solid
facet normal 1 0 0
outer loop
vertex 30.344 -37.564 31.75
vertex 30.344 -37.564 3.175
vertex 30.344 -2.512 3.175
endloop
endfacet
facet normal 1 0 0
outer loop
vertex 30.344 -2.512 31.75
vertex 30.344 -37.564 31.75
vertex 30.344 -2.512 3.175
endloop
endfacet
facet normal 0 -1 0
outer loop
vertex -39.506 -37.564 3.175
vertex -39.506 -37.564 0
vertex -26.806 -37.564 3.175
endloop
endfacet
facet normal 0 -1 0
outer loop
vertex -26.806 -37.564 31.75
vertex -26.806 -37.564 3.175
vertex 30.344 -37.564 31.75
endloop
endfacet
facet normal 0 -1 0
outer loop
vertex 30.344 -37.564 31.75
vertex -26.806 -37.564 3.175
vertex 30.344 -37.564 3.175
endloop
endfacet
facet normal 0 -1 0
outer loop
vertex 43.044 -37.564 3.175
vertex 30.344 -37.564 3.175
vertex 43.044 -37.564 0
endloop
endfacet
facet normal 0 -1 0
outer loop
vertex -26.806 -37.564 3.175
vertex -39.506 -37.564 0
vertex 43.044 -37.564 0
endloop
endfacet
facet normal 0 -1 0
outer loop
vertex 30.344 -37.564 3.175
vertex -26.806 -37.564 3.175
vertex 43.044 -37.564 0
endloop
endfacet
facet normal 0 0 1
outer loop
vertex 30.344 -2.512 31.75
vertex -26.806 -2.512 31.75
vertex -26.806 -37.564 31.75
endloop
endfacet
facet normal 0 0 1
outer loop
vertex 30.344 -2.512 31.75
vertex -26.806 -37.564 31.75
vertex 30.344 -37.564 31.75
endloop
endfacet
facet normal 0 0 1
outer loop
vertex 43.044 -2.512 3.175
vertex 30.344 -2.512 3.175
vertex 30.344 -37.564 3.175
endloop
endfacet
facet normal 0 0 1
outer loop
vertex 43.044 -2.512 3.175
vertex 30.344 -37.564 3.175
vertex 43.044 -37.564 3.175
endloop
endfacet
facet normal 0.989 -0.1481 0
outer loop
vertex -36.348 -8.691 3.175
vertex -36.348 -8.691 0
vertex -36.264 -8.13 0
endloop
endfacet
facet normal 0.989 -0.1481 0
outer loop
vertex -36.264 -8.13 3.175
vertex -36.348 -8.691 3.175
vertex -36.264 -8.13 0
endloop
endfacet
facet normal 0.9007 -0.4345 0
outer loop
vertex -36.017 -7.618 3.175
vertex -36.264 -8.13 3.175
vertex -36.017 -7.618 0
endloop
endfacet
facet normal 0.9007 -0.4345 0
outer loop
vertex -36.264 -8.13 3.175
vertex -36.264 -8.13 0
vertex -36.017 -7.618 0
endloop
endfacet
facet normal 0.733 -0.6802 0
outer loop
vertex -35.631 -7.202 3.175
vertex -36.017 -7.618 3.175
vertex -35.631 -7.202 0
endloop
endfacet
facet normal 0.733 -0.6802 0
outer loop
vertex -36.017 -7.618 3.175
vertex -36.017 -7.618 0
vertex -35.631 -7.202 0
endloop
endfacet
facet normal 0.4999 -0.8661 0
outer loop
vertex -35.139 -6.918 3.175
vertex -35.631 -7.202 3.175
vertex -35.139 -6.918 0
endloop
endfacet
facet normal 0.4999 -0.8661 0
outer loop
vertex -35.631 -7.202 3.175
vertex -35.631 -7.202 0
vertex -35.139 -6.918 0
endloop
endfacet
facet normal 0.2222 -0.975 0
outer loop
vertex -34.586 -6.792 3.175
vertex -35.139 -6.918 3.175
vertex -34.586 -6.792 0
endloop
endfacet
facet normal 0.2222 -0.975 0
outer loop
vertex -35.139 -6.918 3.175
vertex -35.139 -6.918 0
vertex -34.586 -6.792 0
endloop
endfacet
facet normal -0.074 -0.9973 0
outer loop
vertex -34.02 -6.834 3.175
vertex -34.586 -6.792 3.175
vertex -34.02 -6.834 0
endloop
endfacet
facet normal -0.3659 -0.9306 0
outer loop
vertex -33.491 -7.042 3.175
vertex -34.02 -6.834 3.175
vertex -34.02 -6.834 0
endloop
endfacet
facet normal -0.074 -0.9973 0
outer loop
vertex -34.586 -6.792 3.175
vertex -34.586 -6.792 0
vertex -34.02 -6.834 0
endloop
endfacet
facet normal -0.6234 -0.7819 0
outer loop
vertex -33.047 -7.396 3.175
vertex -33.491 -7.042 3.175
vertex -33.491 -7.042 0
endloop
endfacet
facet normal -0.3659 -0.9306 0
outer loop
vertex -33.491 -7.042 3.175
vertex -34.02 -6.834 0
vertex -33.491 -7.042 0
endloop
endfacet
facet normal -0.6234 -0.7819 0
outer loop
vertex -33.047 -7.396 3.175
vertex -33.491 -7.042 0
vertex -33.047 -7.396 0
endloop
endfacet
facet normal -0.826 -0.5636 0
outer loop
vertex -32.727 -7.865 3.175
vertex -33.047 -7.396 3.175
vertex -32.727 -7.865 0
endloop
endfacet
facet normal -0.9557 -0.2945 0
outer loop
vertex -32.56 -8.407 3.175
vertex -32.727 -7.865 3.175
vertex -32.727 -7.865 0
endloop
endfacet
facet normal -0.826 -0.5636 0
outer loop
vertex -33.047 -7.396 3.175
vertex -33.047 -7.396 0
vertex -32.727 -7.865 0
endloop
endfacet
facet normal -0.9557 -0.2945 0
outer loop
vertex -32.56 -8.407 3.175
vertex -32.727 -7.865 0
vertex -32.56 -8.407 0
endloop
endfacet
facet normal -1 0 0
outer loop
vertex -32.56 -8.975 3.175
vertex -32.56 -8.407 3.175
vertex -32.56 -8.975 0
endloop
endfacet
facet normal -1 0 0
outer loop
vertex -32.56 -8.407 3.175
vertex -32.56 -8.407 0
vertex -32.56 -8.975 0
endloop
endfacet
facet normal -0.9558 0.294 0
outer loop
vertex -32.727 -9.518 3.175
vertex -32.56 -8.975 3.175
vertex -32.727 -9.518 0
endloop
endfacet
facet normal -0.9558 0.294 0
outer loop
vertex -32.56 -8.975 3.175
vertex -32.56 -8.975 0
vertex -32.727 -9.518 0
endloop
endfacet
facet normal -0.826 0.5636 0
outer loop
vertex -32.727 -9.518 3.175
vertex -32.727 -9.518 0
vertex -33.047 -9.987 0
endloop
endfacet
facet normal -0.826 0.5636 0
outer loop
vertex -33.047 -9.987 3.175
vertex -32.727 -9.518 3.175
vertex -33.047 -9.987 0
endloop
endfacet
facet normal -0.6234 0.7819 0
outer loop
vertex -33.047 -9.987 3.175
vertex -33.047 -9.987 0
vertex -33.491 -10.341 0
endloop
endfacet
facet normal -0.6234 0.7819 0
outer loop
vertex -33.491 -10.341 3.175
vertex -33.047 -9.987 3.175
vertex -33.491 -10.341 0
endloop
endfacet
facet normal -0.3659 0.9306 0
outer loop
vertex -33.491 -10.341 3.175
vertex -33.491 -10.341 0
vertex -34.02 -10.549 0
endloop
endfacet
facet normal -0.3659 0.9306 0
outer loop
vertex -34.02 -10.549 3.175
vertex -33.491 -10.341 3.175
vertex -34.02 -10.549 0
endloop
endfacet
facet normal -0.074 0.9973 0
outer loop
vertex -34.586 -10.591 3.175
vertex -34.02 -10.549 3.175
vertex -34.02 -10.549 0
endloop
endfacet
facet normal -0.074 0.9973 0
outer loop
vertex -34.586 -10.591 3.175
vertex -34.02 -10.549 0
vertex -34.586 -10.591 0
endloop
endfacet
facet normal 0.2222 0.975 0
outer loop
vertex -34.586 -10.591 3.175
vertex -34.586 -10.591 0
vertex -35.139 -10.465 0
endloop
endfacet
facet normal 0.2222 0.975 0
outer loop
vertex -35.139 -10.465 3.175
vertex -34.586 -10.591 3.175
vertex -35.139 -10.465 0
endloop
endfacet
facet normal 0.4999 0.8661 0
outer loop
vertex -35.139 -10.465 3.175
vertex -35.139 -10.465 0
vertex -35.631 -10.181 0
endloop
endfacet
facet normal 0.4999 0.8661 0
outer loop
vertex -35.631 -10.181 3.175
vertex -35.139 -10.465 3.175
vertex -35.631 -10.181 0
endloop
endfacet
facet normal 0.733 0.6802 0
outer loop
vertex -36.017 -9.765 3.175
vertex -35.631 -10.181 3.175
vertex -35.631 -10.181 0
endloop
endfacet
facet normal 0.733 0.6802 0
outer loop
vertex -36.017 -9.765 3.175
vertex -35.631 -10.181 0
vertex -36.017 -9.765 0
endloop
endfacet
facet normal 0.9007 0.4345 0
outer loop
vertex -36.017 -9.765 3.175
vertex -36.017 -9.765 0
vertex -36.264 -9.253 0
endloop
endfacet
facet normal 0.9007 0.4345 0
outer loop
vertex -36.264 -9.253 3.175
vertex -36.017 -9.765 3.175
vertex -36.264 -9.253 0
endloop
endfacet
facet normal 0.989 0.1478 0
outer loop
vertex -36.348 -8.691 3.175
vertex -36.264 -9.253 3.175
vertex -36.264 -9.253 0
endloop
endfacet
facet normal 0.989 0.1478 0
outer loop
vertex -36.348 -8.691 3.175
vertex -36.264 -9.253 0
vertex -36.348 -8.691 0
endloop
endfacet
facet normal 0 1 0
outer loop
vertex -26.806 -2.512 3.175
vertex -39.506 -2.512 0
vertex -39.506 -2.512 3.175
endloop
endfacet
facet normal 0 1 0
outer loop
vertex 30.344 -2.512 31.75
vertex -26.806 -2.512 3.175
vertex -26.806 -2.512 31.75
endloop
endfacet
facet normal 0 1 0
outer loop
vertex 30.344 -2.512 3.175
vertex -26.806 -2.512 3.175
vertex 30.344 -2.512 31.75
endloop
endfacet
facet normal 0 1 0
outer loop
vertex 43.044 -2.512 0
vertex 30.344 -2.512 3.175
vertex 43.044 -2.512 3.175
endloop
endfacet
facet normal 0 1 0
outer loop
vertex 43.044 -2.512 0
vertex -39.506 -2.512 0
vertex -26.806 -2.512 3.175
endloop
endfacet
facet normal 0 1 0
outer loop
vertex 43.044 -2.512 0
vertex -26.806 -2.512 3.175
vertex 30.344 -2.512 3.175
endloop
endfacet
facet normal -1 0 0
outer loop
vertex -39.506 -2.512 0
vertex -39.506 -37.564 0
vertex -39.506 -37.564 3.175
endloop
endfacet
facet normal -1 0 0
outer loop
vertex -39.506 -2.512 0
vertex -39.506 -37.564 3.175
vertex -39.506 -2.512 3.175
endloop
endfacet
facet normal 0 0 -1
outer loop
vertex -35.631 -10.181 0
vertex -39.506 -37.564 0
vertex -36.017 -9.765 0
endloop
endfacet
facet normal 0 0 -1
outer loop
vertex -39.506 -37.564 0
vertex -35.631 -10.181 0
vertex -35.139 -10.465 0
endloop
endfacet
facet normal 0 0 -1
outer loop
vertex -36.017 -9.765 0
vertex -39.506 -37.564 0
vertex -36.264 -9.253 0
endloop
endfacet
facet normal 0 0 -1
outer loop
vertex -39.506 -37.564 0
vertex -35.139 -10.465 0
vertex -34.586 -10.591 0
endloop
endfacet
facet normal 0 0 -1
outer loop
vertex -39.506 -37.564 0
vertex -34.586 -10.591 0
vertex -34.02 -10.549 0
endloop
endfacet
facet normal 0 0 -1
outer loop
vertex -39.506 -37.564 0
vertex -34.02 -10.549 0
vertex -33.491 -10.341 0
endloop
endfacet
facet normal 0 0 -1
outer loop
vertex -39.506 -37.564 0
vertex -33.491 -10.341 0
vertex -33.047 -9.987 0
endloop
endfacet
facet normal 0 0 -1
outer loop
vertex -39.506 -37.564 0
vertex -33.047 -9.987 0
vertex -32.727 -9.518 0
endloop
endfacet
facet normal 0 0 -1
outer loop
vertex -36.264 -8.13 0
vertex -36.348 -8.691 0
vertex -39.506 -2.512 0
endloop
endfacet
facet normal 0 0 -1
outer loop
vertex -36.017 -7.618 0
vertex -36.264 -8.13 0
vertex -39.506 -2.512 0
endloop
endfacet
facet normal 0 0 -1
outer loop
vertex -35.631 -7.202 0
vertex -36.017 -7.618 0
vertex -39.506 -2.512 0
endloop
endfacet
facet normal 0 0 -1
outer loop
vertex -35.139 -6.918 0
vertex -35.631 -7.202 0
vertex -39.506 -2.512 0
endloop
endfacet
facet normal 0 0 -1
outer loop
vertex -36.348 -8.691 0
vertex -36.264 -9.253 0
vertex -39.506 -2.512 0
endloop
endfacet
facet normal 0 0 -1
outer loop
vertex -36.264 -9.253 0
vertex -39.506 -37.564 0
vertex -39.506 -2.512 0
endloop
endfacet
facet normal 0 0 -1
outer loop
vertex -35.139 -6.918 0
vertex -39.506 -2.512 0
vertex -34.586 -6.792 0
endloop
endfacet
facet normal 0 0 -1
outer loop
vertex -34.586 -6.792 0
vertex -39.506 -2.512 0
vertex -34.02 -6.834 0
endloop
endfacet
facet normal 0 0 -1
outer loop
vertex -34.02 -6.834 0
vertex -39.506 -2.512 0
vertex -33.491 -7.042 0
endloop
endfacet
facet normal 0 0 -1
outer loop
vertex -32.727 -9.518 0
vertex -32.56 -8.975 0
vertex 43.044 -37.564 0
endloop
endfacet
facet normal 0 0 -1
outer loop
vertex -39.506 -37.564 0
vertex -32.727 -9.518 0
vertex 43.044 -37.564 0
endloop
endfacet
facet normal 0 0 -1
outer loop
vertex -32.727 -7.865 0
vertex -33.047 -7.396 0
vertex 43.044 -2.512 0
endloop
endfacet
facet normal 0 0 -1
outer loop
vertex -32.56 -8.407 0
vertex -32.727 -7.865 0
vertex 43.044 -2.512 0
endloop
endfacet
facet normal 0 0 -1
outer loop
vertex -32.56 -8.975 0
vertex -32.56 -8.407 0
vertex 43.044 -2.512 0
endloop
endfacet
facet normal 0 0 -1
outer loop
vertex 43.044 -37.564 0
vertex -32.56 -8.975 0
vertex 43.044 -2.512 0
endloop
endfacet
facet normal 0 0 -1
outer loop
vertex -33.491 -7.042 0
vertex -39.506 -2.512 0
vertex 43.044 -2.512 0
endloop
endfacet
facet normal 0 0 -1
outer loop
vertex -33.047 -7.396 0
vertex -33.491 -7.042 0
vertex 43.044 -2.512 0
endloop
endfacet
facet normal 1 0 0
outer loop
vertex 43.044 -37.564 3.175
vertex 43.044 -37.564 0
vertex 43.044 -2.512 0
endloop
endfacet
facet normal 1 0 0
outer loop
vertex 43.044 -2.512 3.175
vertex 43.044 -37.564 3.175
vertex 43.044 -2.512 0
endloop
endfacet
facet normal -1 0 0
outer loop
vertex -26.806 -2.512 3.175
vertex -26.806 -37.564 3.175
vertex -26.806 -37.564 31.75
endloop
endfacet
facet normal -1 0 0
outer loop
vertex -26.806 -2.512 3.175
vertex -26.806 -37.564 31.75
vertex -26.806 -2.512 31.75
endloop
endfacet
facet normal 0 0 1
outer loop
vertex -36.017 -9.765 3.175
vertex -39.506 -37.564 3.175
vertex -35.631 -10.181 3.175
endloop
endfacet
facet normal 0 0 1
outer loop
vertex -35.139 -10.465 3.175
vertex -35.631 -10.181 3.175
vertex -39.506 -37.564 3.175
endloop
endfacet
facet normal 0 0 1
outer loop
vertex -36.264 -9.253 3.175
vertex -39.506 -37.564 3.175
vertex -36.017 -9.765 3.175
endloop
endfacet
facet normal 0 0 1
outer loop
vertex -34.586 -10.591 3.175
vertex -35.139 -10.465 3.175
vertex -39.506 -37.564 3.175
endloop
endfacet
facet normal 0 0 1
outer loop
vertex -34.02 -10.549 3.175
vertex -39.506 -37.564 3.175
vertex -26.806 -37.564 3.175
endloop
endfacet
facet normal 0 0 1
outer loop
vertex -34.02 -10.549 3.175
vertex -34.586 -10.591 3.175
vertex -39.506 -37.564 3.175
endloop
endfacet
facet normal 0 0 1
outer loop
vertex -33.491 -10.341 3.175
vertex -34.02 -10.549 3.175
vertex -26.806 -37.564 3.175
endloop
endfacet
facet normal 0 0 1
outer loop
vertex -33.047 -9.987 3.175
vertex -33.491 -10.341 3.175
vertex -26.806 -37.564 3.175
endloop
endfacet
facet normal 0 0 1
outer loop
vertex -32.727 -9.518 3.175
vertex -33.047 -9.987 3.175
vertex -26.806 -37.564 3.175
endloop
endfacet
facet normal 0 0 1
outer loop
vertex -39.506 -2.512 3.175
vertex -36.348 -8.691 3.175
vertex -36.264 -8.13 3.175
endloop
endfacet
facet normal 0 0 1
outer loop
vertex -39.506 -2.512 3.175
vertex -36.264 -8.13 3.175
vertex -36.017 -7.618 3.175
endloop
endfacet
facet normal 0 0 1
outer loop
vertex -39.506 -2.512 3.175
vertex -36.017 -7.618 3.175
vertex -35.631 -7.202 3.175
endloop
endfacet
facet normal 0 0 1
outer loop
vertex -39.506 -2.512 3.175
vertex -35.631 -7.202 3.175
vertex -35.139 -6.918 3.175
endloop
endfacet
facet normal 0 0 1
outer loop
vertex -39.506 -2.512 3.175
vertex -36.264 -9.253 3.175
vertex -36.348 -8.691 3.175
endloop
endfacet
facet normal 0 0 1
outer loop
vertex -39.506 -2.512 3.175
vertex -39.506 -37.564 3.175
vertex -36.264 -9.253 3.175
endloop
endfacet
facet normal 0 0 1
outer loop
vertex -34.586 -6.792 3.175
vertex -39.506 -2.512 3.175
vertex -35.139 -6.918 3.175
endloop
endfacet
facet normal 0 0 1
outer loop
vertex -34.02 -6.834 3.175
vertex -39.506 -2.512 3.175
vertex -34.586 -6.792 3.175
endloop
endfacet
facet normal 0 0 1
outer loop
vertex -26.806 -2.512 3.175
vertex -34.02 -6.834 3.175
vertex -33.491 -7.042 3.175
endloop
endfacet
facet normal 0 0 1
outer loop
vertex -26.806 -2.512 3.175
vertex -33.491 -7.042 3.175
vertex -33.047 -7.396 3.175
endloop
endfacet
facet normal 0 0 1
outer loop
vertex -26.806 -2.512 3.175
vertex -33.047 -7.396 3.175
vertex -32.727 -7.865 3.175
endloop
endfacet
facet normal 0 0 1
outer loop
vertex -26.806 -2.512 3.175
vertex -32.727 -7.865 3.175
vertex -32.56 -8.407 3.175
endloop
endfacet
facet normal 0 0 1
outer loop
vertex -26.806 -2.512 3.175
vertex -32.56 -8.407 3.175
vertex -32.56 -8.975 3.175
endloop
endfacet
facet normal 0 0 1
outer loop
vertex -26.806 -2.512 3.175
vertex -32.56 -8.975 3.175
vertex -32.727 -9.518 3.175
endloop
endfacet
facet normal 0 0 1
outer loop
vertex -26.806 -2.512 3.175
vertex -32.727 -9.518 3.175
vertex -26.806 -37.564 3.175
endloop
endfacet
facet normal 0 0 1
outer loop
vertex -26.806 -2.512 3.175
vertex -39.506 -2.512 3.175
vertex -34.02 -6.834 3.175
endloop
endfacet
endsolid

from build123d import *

# Parameters (mm, degrees)
F0_W     = 82.55
F0_H     = 35.052
F1_DEPTH = 3.175
F3_D     = 3.81
F4_W     = 57.15
F4_H     = 35.052
F5_DEPTH = 31.75


with BuildPart() as f1:
    # F0 (on Top) → F1 (new body)
    with BuildSketch(Plane.XY):
        with Locations((1.768986, -20.037849)):
            Rectangle(F0_W, F0_H)
    extrude(amount=F1_DEPTH)

    # F3 (through all)
    with Locations(Plane.XY.offset(3.175)):
        with Locations((-34.443449, -8.69142)):
            Hole(F3_D / 2)

    # F4 (on Top) → F5 (join)
    with BuildSketch(Plane.XY):
        with Locations((1.768986, -20.037849)):
            Rectangle(F4_W, F4_H)
    extrude(amount=F5_DEPTH)


solid = f1.part
